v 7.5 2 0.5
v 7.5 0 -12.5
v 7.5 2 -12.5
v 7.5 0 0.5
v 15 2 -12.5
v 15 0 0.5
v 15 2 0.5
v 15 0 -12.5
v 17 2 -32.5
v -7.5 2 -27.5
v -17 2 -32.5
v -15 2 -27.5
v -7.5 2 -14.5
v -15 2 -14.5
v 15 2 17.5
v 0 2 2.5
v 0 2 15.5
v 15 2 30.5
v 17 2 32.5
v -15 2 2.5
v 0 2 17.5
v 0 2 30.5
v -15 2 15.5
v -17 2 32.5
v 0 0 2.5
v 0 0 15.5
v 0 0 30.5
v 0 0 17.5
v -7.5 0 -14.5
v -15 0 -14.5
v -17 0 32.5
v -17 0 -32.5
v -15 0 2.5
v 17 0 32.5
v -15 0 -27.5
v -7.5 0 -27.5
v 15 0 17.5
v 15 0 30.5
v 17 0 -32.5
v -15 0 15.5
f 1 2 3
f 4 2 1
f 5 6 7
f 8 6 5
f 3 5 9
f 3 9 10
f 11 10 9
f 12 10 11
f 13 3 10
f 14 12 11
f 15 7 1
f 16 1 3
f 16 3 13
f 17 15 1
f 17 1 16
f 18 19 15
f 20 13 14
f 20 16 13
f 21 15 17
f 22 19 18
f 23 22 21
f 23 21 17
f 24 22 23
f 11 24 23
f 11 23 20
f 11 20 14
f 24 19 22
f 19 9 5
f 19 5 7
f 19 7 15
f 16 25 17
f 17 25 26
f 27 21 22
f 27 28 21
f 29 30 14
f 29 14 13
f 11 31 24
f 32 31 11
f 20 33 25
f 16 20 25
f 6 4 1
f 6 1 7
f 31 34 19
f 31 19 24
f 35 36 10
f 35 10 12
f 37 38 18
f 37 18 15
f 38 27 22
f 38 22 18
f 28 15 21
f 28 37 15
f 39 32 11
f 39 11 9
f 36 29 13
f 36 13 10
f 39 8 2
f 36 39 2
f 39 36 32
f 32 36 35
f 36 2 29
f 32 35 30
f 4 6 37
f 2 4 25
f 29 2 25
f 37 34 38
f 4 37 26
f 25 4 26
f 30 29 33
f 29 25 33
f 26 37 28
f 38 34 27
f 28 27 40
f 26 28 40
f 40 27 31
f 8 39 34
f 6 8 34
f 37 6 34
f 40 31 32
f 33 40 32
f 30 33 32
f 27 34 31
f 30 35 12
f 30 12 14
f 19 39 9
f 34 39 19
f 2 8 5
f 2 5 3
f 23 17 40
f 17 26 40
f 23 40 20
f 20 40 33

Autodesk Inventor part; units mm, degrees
ref_plane "YZ Plane" through (0, 0, 0) normal (1, 0, 0) x (0, 1, 0)
ref_plane "XZ Plane" through (0, 0, 0) normal (0, 1, 0) x (-1, 0, 0)
ref_plane "XY Plane" through (0, 0, 0) normal (0, 0, 1) x (1, 0, 0)
sketch "Sketch2" plane through (0, 0, 0) normal (0, 1, 0) x (-1, 0, 0)
  line L0 (-17, 32.5) -> (17, 32.5)
  line L1 (17, 32.5) -> (17, -32.5)
  line L2 (17, -32.5) -> (-17, -32.5)
  line L3 (-17, -32.5) -> (-17, 32.5)
  line L4 (-17, 32.5) -> (17, -32.5) construction
  line L5 (17, 32.5) -> (-17, -32.5) construction
  line L6 (0, 30.5) -> (-15, 30.5)
  line L7 (-15, 30.5) -> (-15, 17.5)
  line L8 (-15, 17.5) -> (0, 17.5)
  line L9 (0, 17.5) -> (0, 30.5)
  line L10 (0, 15.5) -> (15, 15.5)
  line L11 (15, 15.5) -> (15, 2.5)
  line L12 (15, 2.5) -> (0, 2.5)
  line L13 (0, 2.5) -> (0, 15.5)
  line L14 (-7.5, 0.5) -> (-15, 0.5)
  line L15 (-15, 0.5) -> (-15, -12.5)
  line L16 (-15, -12.5) -> (-7.5, -12.5)
  line L17 (-7.5, -12.5) -> (-7.5, 0.5)
  line L18 (15, -14.5) -> (7.5, -14.5)
  line L19 (7.5, -14.5) -> (7.5, -27.5)
  line L20 (7.5, -27.5) -> (15, -27.5)
  line L21 (15, -27.5) -> (15, -14.5)
  point P0 (0, 0)
  dimension "d35" = 34
  dimension "d36" = 65
  dimension "d37" = 15
  dimension "d38" = 13
  dimension "d39" = 15
  dimension "d40" = 13
  dimension "d41" = 2
  dimension "d42" = 2
  dimension "d43" = 0
  dimension "d44" = 2
  dimension "d45" = 7.5
  dimension "d46" = 13
  dimension "d47" = 7.5
  dimension "d48" = 2
  dimension "d49" = 7.5
  dimension "d50" = 13
  dimension "d51" = 2
  dimension "d52" = 2
extrude "Extrusion4" add sketch "Sketch2" along normal blind 2
sketch "Sketch3" plane through (0, 0, 0) normal (0, 1, 0) x (-1, 0, 0)
  circle A0 centre (0, 57.5) radius 97.6 construction
  line L0 (17, 32.5) -> (-17, 32.5) projected
  point P0 (0, 0)
  dimension "d55" = 195.2
  dimension "d56" = 25
properties part number "Molecule Chopper"
